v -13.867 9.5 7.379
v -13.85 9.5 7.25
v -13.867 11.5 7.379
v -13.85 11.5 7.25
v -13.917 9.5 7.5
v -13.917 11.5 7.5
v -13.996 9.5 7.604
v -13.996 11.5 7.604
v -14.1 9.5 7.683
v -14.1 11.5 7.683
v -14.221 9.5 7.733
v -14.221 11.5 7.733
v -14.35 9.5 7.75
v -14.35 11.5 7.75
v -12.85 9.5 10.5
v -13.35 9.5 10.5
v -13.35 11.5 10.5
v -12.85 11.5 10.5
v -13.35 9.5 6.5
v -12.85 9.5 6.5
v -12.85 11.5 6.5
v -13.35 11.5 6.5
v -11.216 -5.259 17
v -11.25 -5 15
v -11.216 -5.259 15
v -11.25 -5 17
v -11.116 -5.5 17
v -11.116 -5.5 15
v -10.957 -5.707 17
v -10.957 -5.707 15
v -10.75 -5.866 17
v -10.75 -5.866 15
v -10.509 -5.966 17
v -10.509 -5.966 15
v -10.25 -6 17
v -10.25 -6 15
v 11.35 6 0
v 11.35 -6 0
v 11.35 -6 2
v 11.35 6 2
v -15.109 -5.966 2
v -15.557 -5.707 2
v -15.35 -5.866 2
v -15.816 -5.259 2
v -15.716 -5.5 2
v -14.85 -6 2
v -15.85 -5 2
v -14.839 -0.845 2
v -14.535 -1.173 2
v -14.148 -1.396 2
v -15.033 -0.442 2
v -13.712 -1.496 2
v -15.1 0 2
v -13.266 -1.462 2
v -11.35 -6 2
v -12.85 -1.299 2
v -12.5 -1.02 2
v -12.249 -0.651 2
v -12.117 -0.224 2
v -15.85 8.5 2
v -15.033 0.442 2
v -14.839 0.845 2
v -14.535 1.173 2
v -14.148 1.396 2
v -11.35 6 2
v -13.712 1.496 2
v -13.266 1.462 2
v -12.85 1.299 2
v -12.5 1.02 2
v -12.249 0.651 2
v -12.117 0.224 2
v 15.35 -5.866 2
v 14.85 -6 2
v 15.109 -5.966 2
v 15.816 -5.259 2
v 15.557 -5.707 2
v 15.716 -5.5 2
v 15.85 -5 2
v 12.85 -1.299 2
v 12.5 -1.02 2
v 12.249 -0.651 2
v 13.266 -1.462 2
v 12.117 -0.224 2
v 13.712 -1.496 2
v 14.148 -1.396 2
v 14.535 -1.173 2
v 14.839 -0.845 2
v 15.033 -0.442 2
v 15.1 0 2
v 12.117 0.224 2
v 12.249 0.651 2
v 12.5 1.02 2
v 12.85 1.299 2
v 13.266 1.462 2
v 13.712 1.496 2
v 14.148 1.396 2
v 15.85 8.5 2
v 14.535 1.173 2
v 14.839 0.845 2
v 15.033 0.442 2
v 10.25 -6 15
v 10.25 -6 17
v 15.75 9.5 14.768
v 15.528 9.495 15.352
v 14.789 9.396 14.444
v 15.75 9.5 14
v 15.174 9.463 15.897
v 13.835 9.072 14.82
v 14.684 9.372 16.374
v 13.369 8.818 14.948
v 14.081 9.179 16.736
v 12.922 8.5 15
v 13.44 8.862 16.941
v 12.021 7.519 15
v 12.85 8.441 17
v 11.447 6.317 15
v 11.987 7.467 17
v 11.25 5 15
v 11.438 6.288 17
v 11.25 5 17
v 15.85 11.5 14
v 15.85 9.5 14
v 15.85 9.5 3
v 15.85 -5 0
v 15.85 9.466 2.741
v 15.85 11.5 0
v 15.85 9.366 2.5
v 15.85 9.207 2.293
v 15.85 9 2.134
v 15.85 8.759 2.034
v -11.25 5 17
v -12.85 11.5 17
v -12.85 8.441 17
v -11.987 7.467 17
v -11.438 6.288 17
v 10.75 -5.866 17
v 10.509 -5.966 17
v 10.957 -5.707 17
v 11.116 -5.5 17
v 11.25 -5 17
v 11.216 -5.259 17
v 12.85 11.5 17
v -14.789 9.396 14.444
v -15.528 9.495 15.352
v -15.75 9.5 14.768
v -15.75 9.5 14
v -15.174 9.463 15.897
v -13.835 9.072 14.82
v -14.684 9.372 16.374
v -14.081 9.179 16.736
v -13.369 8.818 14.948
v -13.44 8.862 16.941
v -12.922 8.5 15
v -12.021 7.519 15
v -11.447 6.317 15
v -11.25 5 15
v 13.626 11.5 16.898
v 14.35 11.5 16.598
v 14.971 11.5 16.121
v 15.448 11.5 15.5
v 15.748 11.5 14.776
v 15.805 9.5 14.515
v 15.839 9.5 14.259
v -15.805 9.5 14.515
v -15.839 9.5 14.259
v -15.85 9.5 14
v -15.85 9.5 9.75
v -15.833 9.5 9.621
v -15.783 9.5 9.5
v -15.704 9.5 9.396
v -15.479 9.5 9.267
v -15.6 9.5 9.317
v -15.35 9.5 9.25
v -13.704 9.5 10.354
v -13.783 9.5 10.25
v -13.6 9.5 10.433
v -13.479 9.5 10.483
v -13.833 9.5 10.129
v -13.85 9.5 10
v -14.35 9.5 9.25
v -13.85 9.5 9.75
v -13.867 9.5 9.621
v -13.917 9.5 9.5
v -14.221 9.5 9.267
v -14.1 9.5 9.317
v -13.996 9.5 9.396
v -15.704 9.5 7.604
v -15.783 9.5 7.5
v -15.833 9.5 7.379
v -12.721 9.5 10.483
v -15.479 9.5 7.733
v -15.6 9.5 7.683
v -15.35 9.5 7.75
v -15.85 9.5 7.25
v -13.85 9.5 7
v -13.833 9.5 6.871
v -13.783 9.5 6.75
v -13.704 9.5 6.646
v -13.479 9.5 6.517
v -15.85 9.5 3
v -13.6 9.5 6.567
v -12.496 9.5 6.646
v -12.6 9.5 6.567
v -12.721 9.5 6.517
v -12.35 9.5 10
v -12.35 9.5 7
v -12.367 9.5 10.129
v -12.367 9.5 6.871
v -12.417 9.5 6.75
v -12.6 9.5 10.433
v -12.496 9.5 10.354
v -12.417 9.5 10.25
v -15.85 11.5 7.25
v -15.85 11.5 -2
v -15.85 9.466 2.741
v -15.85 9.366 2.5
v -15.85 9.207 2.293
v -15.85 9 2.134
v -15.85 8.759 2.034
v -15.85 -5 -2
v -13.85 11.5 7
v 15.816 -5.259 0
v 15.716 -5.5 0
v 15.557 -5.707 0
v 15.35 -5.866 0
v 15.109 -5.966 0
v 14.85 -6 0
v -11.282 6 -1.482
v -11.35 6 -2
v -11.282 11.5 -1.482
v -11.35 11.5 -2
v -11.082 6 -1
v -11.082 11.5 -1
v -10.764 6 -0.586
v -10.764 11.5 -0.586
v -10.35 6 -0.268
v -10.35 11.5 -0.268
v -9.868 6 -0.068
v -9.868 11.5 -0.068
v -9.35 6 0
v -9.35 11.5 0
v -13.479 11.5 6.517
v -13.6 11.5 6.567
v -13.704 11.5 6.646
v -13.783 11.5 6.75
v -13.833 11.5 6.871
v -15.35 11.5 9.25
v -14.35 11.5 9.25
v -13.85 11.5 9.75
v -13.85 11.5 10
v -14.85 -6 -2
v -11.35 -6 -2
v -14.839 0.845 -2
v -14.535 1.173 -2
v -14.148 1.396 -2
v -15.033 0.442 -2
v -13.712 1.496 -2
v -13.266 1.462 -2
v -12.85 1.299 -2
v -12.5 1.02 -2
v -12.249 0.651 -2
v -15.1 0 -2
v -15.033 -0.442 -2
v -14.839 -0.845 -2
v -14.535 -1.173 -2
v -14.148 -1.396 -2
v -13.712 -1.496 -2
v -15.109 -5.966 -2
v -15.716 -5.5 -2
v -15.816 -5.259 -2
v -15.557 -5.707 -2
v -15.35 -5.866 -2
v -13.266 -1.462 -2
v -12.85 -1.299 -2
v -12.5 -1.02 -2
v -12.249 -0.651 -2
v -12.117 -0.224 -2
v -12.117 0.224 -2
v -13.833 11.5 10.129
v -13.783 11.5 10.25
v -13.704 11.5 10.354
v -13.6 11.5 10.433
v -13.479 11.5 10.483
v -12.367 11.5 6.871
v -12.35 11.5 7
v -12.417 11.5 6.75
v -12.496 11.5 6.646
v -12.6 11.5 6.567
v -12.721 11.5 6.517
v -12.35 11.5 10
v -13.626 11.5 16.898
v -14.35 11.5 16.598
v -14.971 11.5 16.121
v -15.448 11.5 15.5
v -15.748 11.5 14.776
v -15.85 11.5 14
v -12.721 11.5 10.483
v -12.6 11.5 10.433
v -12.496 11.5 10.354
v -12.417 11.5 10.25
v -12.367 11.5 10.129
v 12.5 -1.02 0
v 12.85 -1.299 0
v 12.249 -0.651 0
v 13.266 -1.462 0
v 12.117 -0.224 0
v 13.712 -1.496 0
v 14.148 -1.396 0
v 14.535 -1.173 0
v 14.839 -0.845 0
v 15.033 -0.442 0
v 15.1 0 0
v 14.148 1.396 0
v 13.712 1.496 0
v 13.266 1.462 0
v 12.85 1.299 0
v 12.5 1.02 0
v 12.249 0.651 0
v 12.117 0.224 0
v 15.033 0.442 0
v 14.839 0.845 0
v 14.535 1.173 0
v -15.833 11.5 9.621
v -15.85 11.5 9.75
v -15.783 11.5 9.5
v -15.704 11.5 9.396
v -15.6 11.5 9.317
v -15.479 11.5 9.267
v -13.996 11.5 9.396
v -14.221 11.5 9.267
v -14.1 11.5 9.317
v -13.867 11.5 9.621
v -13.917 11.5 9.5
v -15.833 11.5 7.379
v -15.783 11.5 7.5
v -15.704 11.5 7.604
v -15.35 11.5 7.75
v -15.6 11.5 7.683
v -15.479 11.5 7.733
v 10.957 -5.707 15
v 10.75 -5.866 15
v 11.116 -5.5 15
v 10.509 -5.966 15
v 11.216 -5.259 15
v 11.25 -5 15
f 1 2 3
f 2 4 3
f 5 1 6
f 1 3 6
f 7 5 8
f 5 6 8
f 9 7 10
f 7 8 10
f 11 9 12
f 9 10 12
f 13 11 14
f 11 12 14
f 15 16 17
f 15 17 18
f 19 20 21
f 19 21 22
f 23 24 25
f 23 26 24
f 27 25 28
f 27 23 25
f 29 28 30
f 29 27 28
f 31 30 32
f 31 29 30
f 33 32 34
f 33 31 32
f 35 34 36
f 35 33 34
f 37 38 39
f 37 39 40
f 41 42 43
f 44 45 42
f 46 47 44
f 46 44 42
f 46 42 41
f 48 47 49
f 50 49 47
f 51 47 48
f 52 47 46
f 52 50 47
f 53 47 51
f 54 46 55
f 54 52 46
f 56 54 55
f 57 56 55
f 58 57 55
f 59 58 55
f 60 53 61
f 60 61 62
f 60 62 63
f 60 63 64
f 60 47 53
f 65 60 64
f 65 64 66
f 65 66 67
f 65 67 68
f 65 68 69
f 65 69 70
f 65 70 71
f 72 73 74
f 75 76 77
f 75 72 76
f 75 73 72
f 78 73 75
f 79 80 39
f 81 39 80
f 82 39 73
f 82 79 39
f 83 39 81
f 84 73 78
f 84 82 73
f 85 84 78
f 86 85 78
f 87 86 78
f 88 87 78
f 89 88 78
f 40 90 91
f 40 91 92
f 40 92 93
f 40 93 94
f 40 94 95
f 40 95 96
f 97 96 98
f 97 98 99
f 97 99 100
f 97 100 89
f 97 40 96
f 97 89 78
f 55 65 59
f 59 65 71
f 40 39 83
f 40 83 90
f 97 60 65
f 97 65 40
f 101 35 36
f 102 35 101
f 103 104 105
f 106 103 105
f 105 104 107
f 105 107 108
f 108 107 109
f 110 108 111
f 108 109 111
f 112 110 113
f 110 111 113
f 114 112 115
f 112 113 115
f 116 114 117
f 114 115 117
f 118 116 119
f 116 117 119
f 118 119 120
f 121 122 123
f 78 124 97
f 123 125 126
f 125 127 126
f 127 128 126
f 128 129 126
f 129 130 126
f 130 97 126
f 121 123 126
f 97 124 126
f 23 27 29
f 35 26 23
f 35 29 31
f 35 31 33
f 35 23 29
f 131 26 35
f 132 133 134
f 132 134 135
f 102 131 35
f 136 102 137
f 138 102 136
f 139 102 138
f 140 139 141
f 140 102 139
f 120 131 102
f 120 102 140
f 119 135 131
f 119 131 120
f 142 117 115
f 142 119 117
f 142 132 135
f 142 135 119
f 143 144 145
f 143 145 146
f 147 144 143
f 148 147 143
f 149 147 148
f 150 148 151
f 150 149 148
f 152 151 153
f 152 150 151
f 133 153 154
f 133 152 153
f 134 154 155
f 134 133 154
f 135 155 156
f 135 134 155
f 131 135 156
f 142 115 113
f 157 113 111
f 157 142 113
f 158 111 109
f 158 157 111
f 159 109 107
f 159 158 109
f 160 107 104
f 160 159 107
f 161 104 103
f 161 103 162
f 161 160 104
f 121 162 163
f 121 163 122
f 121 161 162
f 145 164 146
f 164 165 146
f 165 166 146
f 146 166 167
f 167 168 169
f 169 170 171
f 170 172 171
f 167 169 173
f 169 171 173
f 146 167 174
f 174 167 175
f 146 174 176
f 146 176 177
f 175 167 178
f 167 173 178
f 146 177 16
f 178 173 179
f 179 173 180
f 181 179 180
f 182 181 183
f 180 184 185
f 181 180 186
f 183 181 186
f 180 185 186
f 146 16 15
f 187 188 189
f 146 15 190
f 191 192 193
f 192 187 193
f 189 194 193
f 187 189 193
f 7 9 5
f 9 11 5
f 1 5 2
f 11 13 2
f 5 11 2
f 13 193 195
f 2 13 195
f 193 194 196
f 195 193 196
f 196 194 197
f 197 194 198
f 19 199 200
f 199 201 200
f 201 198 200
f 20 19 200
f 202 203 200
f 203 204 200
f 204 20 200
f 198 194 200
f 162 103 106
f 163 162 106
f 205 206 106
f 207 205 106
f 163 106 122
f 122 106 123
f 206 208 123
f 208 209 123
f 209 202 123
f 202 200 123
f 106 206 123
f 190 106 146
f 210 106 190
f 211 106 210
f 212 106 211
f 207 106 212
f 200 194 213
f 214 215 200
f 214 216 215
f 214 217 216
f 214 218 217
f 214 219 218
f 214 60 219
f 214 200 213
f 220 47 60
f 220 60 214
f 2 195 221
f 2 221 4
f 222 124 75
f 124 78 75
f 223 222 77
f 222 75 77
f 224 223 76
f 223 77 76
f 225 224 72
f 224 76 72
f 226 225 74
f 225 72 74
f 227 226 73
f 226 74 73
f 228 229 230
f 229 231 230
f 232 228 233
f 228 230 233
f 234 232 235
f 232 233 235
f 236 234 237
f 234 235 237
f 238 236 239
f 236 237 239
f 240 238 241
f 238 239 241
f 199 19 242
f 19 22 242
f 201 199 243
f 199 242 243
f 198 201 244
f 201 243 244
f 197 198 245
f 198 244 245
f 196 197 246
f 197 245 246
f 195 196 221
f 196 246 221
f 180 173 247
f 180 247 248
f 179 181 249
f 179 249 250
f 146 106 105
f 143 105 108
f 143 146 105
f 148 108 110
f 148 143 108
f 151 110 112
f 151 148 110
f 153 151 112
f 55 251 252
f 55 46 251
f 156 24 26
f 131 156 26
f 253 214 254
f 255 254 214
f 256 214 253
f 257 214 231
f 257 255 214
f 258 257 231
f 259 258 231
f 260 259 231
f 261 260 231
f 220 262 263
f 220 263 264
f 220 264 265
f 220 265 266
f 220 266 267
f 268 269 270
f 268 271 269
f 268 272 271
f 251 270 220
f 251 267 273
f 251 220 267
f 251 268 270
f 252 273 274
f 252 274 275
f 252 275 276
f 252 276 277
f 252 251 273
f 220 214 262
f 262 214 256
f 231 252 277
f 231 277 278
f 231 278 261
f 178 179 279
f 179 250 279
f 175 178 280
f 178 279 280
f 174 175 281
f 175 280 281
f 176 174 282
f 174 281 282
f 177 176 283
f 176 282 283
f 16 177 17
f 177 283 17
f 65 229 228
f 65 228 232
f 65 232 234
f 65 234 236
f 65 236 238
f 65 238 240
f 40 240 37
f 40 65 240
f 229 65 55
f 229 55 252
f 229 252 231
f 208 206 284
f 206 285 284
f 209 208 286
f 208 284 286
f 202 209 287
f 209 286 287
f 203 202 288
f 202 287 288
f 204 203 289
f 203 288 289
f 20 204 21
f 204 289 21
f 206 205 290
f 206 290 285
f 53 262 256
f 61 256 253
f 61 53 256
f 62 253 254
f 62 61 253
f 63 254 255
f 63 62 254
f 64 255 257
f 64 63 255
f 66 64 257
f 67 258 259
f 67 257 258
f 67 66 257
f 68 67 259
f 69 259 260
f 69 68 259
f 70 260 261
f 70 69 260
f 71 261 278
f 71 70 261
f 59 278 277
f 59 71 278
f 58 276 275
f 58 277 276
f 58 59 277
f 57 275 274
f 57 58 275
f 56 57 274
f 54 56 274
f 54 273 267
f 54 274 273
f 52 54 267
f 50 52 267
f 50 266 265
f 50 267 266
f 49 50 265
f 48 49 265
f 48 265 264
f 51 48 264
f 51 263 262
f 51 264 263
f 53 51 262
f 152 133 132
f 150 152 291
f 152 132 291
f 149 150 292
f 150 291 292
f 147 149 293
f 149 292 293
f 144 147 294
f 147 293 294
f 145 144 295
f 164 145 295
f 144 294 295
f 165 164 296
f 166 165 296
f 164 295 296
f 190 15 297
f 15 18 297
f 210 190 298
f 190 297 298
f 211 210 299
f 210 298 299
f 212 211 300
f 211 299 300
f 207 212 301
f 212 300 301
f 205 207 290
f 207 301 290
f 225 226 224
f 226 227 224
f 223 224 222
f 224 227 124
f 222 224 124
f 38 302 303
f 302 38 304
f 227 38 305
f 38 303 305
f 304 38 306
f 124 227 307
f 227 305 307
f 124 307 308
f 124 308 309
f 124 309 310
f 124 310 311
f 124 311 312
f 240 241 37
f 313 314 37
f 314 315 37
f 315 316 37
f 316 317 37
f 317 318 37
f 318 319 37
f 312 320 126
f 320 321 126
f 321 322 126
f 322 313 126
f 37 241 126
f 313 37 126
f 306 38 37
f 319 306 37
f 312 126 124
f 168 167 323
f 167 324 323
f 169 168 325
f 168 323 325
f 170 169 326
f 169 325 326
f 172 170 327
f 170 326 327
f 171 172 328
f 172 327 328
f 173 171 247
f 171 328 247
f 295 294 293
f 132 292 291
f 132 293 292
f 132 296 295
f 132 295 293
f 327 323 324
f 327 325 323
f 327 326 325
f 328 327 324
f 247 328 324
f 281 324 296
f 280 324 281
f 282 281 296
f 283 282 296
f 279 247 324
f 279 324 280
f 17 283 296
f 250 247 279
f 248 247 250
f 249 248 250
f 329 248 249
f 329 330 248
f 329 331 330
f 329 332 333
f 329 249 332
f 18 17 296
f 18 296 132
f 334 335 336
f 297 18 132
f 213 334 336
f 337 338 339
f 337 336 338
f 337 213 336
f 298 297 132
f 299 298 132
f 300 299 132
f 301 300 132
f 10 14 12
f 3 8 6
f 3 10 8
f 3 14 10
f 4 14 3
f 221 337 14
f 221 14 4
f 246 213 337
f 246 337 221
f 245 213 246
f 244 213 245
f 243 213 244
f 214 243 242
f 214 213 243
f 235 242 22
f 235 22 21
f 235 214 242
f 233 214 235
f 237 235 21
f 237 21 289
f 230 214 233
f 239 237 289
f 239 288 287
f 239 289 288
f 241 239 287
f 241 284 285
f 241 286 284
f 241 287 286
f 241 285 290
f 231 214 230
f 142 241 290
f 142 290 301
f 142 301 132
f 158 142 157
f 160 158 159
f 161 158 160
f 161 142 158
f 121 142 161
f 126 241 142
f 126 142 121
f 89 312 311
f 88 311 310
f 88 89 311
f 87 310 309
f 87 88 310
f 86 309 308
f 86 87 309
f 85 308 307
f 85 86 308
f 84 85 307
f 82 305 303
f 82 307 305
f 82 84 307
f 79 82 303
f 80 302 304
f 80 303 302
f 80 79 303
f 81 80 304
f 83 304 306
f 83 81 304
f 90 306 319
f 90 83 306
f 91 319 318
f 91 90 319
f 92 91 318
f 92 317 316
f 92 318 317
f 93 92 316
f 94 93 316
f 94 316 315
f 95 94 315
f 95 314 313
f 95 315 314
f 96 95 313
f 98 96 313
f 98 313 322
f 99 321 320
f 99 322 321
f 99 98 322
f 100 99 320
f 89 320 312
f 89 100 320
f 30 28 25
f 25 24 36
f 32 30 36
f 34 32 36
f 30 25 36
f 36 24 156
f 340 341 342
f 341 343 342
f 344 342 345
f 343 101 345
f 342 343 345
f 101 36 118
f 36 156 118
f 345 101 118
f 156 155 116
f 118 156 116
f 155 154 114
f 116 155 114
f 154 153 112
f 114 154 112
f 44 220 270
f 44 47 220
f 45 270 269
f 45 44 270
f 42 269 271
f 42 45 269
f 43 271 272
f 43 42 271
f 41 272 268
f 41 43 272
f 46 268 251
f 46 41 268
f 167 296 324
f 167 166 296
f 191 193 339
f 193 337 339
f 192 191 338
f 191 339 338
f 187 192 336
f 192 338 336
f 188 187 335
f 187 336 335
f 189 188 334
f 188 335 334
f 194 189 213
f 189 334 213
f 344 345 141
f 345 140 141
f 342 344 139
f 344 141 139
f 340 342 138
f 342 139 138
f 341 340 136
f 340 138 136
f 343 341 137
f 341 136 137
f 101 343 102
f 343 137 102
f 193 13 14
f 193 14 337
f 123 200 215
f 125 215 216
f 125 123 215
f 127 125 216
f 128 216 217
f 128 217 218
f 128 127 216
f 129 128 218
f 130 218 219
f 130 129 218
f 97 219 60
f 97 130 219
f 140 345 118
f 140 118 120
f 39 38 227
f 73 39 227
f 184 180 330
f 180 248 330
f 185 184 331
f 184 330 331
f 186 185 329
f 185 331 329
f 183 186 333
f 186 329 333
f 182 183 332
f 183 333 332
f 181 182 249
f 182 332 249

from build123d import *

# Parameters (mm, degrees)
SKETCH_1_W          = 4.5
SKETCH_1_H          = 12
EXTRUDE_1_DEPTH     = 2
EXTRUDE_1_2_DEPTH   = 2
SKETCH_2_W          = 4.5
SKETCH_2_H          = 12
EXTRUDE_4_DEPTH     = 2
SKETCH_4_R          = 1.5
CUT_EXTRUDE_1_DEPTH = 18.413285158
SKETCH_5_W          = 31.7
SKETCH_5_H          = 5.5
EXTRUDE_5_DEPTH     = 2
SKETCH_6_W          = 31.7
SKETCH_6_H          = 2
EXTRUDE_6_DEPTH     = 15
SKETCH_7_W          = 22.5
SKETCH_7_H          = 2
EXTRUDE_7_DEPTH     = 15.5
FILLET_3_R          = 1
FILLET_4_R          = 4.5
FILLET_5_R          = 1
FILLET_6_R          = 3
SKETCH_8_W          = 4.5
SKETCH_8_H          = 2
EXTRUDE_8_DEPTH     = 5.5
FILLET_7_R          = 2
CUT_EXTRUDE_2_DEPTH = 28.936938031
FILLET_8_R          = 0.5


with BuildPart() as part:
    # 草图1 → 凸台-拉伸1 (new body)
    with BuildSketch(Plane.XY):
        with Locations((13.6, 0)):
            Rectangle(SKETCH_1_W, SKETCH_1_H)
    extrude(amount=EXTRUDE_1_DEPTH)


with BuildPart() as body_2:
    # 草图1 → Extrude 1 2 (new body)
    with BuildSketch(Plane.XY):
        with Locations((-13.6, 0)):
            Rectangle(SKETCH_1_W, SKETCH_1_H)
    extrude(amount=EXTRUDE_1_2_DEPTH)

    # 草图2 → 凸台-拉伸4 (add)
    with BuildSketch(Plane.XY):
        with Locations((-13.6, 0)):
            Rectangle(SKETCH_2_W, SKETCH_2_H)
    extrude(amount=-EXTRUDE_4_DEPTH)


with BuildPart() as cut_extrude_1_tool:
    # 草图4 → 切除-拉伸1 (new, through all)
    with BuildSketch(Plane(origin=(0, 0, 2), x_dir=(-1, 0, 0), z_dir=(0, 0, -1))):
        with Locations((13.6, 0)):
            Circle(SKETCH_4_R)
        with Locations(Location((-13.6, 0, 0), (0, 0, 180))):
            Circle(SKETCH_4_R)
    extrude(amount=CUT_EXTRUDE_1_DEPTH)


with BuildPart() as part_1:
    add(part.part)

    # 切除-拉伸1: cut by cut_extrude_1_tool
    add(cut_extrude_1_tool.part, mode=Mode.SUBTRACT)



with BuildPart() as body_2_1:
    add(body_2.part)

    # 切除-拉伸1: cut by cut_extrude_1_tool
    add(cut_extrude_1_tool.part, mode=Mode.SUBTRACT)


with BuildPart() as part_2:
    add(part_1.part)

    add(body_2_1.part)  # 凸台-拉伸5 merges body 2
    # 草图5 → 凸台-拉伸5 (add)
    with BuildSketch(Plane.XY.offset(2)):
        with Locations((0, 8.75)):
            Rectangle(SKETCH_5_W, SKETCH_5_H)
    extrude(amount=-EXTRUDE_5_DEPTH)

    # 草图6 → 凸台-拉伸6 (add)
    with BuildSketch(Plane.XY.offset(2)):
        with Locations((0, 10.5)):
            Rectangle(SKETCH_6_W, SKETCH_6_H)
    extrude(amount=EXTRUDE_6_DEPTH)

    # 草图7 → 凸台-拉伸7 (add)
    with BuildSketch(Plane.XZ.offset(-9.5)):
        with Locations((0, 16)):
            Rectangle(SKETCH_7_W, SKETCH_7_H)
    extrude(amount=EXTRUDE_7_DEPTH)

    # 圆角3
    fillet_3_edges = [part_2.edges().sort_by_distance(p)[0] for p in [
        (-15.85, -6, 0),
        (15.85, -6, 1),
        (11.25, -6, 16),
        (-11.25, -6, 16),
    ]]
    fillet(fillet_3_edges, radius=FILLET_3_R)

    # 圆角4
    fillet_4_edges = [part_2.edges().sort_by_distance(p)[0] for p in [
        (11.25, 9.5, 16),
        (-11.25, 9.5, 16),
    ]]
    fillet(fillet_4_edges, radius=FILLET_4_R)

    # 圆角5
    fillet_5_edges = [part_2.edges().sort_by_distance(p)[0] for p in [
        (0, 9.5, 2),
        (0, 9.5, 15),
    ]]
    fillet(fillet_5_edges, radius=FILLET_5_R)

    # 圆角6
    fillet_6_edges = [part_2.edges().sort_by_distance(p)[0] for p in [
        (15.85, 10.5, 17),
        (-15.85, 10.5, 17),
    ]]
    fillet(fillet_6_edges, radius=FILLET_6_R)

    # 草图8 → 凸台-拉伸8 (add)
    with BuildSketch(Plane(origin=(0, 6, 0), x_dir=(1, 0, 0), z_dir=(0, 1, 0))):
        with Locations((-13.6, 1)):
            Rectangle(SKETCH_8_W, SKETCH_8_H)
    extrude(amount=EXTRUDE_8_DEPTH)

    # 圆角7
    fillet_7_edges = [part_2.edges().sort_by_distance(p)[0] for p in [
        (-11.35, 8.75, 0),
    ]]
    fillet(fillet_7_edges, radius=FILLET_7_R - 0.0001)  # a hair under: the kernel refuses the full size

    # 草图9 → 切除-拉伸2 (cut, through all)
    with BuildSketch(Plane.XZ.offset(-9.5)):
        Polygon((-15.85, 9.25), (-13.85, 9.25), (-13.85, 10.5), (-12.35, 10.5), (-12.35, 6.5), (-13.85, 6.5), (-13.85, 7.75), (-15.85, 7.75), align=None)
    extrude(amount=-CUT_EXTRUDE_2_DEPTH, mode=Mode.SUBTRACT)

    # 圆角8
    fillet_8_edges = [part_2.edges().sort_by_distance(p)[0] for p in [
        (-15.85, 10.5, 7.75),
        (-15.85, 10.5, 9.25),
        (-13.85, 10.5, 9.25),
        (-13.85, 10.5, 10.5),
        (-12.35, 10.5, 10.5),
        (-12.35, 10.5, 6.5),
        (-13.85, 10.5, 6.5),
        (-13.85, 10.5, 7.75),
    ]]
    fillet(fillet_8_edges, radius=FILLET_8_R)


solid = part_2.part
